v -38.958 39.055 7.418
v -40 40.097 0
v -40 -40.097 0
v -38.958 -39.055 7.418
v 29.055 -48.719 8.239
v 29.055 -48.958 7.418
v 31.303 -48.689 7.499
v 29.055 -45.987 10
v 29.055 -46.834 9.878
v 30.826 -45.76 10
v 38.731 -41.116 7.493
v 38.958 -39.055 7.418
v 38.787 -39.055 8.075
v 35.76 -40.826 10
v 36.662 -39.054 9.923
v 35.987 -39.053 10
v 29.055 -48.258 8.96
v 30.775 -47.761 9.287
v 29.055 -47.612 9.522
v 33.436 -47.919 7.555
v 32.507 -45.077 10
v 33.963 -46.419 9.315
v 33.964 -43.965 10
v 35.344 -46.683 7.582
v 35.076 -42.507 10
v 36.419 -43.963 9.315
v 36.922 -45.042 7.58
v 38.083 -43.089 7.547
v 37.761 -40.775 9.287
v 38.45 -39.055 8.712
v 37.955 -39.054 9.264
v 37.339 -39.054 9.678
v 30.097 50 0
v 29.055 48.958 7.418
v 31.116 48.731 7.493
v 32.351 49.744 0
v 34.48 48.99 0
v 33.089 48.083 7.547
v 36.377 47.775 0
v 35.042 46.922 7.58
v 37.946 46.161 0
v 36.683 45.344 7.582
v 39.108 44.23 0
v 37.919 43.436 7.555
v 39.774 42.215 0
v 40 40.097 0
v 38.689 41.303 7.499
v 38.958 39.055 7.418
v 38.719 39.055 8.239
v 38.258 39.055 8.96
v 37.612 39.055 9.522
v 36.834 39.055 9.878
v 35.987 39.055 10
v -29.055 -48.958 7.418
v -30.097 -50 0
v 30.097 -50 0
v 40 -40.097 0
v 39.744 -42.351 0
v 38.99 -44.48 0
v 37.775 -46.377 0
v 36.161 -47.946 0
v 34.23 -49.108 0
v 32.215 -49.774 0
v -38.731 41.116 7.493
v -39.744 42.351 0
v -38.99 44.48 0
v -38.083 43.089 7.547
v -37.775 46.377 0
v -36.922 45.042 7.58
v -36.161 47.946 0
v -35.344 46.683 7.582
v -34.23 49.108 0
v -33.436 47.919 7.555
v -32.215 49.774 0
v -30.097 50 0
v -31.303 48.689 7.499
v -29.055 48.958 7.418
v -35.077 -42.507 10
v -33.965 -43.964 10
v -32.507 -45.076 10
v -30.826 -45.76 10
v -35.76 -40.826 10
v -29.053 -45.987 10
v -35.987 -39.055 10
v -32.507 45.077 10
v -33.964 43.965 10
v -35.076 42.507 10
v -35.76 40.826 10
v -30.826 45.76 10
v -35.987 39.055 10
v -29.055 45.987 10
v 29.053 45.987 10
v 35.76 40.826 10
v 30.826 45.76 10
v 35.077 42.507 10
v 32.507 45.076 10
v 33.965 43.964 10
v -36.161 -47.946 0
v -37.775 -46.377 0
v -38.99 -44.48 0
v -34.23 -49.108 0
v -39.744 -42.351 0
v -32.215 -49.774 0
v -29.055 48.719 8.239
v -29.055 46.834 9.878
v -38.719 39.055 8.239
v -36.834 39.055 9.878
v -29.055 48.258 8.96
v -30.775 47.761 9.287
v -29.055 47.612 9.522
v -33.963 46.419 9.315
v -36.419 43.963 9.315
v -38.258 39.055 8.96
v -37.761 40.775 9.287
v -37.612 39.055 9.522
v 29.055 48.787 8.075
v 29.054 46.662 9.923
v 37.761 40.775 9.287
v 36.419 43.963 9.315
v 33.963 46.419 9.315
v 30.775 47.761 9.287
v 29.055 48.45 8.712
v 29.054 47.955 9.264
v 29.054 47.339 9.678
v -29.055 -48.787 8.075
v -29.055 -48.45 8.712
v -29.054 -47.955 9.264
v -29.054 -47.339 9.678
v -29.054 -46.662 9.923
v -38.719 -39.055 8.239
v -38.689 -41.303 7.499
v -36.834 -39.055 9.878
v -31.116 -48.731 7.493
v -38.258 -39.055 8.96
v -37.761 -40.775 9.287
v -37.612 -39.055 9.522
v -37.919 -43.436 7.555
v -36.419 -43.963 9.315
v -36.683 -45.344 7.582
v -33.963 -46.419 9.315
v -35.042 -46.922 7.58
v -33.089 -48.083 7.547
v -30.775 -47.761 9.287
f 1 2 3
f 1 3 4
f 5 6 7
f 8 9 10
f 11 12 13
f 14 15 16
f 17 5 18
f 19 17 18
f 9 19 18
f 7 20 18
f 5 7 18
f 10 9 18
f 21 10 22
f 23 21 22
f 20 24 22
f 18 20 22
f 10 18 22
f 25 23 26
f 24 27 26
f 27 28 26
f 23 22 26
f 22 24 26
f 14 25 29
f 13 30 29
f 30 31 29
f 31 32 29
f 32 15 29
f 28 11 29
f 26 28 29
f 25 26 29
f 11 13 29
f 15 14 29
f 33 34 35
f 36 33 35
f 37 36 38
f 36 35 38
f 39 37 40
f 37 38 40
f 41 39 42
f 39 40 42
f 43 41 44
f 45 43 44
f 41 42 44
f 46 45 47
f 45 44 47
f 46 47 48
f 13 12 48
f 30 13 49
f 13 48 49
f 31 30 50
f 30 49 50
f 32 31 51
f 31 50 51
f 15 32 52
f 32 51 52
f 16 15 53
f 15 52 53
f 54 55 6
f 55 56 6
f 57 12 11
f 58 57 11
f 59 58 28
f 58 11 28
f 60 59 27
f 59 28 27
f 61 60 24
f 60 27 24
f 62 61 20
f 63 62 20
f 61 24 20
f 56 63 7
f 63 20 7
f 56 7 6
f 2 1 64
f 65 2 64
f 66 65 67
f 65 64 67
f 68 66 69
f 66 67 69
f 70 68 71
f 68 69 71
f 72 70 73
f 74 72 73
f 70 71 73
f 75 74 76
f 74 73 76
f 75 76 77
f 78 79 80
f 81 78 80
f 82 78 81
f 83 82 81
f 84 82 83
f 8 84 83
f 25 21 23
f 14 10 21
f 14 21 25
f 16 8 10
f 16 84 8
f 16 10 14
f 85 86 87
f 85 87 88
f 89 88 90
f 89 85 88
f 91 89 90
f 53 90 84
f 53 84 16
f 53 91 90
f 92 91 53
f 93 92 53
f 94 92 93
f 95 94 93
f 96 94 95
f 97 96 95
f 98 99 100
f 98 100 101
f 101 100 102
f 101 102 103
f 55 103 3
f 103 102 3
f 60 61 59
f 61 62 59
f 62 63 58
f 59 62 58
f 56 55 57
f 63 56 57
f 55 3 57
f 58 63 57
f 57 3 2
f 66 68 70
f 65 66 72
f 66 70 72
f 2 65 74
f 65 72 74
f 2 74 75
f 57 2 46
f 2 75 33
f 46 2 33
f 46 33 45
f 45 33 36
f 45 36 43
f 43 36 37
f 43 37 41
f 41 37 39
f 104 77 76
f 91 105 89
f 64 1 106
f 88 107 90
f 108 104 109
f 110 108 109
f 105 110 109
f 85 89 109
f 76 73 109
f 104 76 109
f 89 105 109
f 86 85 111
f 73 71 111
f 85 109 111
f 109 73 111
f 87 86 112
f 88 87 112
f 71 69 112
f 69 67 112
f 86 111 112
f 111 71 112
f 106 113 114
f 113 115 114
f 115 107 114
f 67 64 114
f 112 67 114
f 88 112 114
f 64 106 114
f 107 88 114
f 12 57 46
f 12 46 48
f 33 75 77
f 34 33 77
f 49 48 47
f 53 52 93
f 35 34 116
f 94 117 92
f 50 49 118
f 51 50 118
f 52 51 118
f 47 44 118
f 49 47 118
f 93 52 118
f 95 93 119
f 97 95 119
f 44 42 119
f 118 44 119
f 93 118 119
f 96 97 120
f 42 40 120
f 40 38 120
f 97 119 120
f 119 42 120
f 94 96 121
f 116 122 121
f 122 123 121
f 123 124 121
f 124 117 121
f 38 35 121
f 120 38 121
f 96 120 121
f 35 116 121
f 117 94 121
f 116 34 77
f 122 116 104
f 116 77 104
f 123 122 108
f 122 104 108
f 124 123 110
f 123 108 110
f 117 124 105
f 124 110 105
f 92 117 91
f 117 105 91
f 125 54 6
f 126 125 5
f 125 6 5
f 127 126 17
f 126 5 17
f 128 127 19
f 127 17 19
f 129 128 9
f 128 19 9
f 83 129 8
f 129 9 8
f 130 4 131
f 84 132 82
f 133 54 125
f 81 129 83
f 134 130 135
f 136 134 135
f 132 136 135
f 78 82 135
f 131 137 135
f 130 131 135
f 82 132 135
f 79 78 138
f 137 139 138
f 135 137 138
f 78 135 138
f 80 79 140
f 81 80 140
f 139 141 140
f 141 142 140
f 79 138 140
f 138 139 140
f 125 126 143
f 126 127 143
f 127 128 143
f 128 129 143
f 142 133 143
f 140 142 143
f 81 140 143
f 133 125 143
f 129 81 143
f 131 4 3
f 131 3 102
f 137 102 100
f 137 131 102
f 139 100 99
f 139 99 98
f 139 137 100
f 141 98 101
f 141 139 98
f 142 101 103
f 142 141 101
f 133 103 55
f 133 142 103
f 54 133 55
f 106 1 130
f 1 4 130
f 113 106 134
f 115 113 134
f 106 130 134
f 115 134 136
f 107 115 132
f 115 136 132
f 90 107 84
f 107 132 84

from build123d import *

# Parameters (mm, degrees)
F0_W     = 80
F0_H     = 100
F1_DEPTH = 10
F1_TAPER = 8
F2_R     = 10
F3_R     = 3


with BuildPart() as f1:
    # F0 (on Top) → F1 (new body)
    with BuildSketch(Plane.XY):
        Rectangle(F0_W, F0_H)
    extrude(amount=F1_DEPTH, taper=F1_TAPER)

    # F2
    f2_edges = [f1.edges().sort_by_distance(p)[0] for p in [
        (-39.297296, -49.297296, 5),
        (39.297296, -49.297296, 5),
        (39.297296, 49.297296, 5),
        (-39.297296, 49.297296, 5),
    ]]
    fillet(f2_edges, radius=F2_R)

    # F3
    f3_edges = [f1.edges().sort_by_distance(p)[0] for p in [
        (-38.594592, 0, 10),
    ]]
    fillet(f3_edges, radius=F3_R)


solid = f1.part
